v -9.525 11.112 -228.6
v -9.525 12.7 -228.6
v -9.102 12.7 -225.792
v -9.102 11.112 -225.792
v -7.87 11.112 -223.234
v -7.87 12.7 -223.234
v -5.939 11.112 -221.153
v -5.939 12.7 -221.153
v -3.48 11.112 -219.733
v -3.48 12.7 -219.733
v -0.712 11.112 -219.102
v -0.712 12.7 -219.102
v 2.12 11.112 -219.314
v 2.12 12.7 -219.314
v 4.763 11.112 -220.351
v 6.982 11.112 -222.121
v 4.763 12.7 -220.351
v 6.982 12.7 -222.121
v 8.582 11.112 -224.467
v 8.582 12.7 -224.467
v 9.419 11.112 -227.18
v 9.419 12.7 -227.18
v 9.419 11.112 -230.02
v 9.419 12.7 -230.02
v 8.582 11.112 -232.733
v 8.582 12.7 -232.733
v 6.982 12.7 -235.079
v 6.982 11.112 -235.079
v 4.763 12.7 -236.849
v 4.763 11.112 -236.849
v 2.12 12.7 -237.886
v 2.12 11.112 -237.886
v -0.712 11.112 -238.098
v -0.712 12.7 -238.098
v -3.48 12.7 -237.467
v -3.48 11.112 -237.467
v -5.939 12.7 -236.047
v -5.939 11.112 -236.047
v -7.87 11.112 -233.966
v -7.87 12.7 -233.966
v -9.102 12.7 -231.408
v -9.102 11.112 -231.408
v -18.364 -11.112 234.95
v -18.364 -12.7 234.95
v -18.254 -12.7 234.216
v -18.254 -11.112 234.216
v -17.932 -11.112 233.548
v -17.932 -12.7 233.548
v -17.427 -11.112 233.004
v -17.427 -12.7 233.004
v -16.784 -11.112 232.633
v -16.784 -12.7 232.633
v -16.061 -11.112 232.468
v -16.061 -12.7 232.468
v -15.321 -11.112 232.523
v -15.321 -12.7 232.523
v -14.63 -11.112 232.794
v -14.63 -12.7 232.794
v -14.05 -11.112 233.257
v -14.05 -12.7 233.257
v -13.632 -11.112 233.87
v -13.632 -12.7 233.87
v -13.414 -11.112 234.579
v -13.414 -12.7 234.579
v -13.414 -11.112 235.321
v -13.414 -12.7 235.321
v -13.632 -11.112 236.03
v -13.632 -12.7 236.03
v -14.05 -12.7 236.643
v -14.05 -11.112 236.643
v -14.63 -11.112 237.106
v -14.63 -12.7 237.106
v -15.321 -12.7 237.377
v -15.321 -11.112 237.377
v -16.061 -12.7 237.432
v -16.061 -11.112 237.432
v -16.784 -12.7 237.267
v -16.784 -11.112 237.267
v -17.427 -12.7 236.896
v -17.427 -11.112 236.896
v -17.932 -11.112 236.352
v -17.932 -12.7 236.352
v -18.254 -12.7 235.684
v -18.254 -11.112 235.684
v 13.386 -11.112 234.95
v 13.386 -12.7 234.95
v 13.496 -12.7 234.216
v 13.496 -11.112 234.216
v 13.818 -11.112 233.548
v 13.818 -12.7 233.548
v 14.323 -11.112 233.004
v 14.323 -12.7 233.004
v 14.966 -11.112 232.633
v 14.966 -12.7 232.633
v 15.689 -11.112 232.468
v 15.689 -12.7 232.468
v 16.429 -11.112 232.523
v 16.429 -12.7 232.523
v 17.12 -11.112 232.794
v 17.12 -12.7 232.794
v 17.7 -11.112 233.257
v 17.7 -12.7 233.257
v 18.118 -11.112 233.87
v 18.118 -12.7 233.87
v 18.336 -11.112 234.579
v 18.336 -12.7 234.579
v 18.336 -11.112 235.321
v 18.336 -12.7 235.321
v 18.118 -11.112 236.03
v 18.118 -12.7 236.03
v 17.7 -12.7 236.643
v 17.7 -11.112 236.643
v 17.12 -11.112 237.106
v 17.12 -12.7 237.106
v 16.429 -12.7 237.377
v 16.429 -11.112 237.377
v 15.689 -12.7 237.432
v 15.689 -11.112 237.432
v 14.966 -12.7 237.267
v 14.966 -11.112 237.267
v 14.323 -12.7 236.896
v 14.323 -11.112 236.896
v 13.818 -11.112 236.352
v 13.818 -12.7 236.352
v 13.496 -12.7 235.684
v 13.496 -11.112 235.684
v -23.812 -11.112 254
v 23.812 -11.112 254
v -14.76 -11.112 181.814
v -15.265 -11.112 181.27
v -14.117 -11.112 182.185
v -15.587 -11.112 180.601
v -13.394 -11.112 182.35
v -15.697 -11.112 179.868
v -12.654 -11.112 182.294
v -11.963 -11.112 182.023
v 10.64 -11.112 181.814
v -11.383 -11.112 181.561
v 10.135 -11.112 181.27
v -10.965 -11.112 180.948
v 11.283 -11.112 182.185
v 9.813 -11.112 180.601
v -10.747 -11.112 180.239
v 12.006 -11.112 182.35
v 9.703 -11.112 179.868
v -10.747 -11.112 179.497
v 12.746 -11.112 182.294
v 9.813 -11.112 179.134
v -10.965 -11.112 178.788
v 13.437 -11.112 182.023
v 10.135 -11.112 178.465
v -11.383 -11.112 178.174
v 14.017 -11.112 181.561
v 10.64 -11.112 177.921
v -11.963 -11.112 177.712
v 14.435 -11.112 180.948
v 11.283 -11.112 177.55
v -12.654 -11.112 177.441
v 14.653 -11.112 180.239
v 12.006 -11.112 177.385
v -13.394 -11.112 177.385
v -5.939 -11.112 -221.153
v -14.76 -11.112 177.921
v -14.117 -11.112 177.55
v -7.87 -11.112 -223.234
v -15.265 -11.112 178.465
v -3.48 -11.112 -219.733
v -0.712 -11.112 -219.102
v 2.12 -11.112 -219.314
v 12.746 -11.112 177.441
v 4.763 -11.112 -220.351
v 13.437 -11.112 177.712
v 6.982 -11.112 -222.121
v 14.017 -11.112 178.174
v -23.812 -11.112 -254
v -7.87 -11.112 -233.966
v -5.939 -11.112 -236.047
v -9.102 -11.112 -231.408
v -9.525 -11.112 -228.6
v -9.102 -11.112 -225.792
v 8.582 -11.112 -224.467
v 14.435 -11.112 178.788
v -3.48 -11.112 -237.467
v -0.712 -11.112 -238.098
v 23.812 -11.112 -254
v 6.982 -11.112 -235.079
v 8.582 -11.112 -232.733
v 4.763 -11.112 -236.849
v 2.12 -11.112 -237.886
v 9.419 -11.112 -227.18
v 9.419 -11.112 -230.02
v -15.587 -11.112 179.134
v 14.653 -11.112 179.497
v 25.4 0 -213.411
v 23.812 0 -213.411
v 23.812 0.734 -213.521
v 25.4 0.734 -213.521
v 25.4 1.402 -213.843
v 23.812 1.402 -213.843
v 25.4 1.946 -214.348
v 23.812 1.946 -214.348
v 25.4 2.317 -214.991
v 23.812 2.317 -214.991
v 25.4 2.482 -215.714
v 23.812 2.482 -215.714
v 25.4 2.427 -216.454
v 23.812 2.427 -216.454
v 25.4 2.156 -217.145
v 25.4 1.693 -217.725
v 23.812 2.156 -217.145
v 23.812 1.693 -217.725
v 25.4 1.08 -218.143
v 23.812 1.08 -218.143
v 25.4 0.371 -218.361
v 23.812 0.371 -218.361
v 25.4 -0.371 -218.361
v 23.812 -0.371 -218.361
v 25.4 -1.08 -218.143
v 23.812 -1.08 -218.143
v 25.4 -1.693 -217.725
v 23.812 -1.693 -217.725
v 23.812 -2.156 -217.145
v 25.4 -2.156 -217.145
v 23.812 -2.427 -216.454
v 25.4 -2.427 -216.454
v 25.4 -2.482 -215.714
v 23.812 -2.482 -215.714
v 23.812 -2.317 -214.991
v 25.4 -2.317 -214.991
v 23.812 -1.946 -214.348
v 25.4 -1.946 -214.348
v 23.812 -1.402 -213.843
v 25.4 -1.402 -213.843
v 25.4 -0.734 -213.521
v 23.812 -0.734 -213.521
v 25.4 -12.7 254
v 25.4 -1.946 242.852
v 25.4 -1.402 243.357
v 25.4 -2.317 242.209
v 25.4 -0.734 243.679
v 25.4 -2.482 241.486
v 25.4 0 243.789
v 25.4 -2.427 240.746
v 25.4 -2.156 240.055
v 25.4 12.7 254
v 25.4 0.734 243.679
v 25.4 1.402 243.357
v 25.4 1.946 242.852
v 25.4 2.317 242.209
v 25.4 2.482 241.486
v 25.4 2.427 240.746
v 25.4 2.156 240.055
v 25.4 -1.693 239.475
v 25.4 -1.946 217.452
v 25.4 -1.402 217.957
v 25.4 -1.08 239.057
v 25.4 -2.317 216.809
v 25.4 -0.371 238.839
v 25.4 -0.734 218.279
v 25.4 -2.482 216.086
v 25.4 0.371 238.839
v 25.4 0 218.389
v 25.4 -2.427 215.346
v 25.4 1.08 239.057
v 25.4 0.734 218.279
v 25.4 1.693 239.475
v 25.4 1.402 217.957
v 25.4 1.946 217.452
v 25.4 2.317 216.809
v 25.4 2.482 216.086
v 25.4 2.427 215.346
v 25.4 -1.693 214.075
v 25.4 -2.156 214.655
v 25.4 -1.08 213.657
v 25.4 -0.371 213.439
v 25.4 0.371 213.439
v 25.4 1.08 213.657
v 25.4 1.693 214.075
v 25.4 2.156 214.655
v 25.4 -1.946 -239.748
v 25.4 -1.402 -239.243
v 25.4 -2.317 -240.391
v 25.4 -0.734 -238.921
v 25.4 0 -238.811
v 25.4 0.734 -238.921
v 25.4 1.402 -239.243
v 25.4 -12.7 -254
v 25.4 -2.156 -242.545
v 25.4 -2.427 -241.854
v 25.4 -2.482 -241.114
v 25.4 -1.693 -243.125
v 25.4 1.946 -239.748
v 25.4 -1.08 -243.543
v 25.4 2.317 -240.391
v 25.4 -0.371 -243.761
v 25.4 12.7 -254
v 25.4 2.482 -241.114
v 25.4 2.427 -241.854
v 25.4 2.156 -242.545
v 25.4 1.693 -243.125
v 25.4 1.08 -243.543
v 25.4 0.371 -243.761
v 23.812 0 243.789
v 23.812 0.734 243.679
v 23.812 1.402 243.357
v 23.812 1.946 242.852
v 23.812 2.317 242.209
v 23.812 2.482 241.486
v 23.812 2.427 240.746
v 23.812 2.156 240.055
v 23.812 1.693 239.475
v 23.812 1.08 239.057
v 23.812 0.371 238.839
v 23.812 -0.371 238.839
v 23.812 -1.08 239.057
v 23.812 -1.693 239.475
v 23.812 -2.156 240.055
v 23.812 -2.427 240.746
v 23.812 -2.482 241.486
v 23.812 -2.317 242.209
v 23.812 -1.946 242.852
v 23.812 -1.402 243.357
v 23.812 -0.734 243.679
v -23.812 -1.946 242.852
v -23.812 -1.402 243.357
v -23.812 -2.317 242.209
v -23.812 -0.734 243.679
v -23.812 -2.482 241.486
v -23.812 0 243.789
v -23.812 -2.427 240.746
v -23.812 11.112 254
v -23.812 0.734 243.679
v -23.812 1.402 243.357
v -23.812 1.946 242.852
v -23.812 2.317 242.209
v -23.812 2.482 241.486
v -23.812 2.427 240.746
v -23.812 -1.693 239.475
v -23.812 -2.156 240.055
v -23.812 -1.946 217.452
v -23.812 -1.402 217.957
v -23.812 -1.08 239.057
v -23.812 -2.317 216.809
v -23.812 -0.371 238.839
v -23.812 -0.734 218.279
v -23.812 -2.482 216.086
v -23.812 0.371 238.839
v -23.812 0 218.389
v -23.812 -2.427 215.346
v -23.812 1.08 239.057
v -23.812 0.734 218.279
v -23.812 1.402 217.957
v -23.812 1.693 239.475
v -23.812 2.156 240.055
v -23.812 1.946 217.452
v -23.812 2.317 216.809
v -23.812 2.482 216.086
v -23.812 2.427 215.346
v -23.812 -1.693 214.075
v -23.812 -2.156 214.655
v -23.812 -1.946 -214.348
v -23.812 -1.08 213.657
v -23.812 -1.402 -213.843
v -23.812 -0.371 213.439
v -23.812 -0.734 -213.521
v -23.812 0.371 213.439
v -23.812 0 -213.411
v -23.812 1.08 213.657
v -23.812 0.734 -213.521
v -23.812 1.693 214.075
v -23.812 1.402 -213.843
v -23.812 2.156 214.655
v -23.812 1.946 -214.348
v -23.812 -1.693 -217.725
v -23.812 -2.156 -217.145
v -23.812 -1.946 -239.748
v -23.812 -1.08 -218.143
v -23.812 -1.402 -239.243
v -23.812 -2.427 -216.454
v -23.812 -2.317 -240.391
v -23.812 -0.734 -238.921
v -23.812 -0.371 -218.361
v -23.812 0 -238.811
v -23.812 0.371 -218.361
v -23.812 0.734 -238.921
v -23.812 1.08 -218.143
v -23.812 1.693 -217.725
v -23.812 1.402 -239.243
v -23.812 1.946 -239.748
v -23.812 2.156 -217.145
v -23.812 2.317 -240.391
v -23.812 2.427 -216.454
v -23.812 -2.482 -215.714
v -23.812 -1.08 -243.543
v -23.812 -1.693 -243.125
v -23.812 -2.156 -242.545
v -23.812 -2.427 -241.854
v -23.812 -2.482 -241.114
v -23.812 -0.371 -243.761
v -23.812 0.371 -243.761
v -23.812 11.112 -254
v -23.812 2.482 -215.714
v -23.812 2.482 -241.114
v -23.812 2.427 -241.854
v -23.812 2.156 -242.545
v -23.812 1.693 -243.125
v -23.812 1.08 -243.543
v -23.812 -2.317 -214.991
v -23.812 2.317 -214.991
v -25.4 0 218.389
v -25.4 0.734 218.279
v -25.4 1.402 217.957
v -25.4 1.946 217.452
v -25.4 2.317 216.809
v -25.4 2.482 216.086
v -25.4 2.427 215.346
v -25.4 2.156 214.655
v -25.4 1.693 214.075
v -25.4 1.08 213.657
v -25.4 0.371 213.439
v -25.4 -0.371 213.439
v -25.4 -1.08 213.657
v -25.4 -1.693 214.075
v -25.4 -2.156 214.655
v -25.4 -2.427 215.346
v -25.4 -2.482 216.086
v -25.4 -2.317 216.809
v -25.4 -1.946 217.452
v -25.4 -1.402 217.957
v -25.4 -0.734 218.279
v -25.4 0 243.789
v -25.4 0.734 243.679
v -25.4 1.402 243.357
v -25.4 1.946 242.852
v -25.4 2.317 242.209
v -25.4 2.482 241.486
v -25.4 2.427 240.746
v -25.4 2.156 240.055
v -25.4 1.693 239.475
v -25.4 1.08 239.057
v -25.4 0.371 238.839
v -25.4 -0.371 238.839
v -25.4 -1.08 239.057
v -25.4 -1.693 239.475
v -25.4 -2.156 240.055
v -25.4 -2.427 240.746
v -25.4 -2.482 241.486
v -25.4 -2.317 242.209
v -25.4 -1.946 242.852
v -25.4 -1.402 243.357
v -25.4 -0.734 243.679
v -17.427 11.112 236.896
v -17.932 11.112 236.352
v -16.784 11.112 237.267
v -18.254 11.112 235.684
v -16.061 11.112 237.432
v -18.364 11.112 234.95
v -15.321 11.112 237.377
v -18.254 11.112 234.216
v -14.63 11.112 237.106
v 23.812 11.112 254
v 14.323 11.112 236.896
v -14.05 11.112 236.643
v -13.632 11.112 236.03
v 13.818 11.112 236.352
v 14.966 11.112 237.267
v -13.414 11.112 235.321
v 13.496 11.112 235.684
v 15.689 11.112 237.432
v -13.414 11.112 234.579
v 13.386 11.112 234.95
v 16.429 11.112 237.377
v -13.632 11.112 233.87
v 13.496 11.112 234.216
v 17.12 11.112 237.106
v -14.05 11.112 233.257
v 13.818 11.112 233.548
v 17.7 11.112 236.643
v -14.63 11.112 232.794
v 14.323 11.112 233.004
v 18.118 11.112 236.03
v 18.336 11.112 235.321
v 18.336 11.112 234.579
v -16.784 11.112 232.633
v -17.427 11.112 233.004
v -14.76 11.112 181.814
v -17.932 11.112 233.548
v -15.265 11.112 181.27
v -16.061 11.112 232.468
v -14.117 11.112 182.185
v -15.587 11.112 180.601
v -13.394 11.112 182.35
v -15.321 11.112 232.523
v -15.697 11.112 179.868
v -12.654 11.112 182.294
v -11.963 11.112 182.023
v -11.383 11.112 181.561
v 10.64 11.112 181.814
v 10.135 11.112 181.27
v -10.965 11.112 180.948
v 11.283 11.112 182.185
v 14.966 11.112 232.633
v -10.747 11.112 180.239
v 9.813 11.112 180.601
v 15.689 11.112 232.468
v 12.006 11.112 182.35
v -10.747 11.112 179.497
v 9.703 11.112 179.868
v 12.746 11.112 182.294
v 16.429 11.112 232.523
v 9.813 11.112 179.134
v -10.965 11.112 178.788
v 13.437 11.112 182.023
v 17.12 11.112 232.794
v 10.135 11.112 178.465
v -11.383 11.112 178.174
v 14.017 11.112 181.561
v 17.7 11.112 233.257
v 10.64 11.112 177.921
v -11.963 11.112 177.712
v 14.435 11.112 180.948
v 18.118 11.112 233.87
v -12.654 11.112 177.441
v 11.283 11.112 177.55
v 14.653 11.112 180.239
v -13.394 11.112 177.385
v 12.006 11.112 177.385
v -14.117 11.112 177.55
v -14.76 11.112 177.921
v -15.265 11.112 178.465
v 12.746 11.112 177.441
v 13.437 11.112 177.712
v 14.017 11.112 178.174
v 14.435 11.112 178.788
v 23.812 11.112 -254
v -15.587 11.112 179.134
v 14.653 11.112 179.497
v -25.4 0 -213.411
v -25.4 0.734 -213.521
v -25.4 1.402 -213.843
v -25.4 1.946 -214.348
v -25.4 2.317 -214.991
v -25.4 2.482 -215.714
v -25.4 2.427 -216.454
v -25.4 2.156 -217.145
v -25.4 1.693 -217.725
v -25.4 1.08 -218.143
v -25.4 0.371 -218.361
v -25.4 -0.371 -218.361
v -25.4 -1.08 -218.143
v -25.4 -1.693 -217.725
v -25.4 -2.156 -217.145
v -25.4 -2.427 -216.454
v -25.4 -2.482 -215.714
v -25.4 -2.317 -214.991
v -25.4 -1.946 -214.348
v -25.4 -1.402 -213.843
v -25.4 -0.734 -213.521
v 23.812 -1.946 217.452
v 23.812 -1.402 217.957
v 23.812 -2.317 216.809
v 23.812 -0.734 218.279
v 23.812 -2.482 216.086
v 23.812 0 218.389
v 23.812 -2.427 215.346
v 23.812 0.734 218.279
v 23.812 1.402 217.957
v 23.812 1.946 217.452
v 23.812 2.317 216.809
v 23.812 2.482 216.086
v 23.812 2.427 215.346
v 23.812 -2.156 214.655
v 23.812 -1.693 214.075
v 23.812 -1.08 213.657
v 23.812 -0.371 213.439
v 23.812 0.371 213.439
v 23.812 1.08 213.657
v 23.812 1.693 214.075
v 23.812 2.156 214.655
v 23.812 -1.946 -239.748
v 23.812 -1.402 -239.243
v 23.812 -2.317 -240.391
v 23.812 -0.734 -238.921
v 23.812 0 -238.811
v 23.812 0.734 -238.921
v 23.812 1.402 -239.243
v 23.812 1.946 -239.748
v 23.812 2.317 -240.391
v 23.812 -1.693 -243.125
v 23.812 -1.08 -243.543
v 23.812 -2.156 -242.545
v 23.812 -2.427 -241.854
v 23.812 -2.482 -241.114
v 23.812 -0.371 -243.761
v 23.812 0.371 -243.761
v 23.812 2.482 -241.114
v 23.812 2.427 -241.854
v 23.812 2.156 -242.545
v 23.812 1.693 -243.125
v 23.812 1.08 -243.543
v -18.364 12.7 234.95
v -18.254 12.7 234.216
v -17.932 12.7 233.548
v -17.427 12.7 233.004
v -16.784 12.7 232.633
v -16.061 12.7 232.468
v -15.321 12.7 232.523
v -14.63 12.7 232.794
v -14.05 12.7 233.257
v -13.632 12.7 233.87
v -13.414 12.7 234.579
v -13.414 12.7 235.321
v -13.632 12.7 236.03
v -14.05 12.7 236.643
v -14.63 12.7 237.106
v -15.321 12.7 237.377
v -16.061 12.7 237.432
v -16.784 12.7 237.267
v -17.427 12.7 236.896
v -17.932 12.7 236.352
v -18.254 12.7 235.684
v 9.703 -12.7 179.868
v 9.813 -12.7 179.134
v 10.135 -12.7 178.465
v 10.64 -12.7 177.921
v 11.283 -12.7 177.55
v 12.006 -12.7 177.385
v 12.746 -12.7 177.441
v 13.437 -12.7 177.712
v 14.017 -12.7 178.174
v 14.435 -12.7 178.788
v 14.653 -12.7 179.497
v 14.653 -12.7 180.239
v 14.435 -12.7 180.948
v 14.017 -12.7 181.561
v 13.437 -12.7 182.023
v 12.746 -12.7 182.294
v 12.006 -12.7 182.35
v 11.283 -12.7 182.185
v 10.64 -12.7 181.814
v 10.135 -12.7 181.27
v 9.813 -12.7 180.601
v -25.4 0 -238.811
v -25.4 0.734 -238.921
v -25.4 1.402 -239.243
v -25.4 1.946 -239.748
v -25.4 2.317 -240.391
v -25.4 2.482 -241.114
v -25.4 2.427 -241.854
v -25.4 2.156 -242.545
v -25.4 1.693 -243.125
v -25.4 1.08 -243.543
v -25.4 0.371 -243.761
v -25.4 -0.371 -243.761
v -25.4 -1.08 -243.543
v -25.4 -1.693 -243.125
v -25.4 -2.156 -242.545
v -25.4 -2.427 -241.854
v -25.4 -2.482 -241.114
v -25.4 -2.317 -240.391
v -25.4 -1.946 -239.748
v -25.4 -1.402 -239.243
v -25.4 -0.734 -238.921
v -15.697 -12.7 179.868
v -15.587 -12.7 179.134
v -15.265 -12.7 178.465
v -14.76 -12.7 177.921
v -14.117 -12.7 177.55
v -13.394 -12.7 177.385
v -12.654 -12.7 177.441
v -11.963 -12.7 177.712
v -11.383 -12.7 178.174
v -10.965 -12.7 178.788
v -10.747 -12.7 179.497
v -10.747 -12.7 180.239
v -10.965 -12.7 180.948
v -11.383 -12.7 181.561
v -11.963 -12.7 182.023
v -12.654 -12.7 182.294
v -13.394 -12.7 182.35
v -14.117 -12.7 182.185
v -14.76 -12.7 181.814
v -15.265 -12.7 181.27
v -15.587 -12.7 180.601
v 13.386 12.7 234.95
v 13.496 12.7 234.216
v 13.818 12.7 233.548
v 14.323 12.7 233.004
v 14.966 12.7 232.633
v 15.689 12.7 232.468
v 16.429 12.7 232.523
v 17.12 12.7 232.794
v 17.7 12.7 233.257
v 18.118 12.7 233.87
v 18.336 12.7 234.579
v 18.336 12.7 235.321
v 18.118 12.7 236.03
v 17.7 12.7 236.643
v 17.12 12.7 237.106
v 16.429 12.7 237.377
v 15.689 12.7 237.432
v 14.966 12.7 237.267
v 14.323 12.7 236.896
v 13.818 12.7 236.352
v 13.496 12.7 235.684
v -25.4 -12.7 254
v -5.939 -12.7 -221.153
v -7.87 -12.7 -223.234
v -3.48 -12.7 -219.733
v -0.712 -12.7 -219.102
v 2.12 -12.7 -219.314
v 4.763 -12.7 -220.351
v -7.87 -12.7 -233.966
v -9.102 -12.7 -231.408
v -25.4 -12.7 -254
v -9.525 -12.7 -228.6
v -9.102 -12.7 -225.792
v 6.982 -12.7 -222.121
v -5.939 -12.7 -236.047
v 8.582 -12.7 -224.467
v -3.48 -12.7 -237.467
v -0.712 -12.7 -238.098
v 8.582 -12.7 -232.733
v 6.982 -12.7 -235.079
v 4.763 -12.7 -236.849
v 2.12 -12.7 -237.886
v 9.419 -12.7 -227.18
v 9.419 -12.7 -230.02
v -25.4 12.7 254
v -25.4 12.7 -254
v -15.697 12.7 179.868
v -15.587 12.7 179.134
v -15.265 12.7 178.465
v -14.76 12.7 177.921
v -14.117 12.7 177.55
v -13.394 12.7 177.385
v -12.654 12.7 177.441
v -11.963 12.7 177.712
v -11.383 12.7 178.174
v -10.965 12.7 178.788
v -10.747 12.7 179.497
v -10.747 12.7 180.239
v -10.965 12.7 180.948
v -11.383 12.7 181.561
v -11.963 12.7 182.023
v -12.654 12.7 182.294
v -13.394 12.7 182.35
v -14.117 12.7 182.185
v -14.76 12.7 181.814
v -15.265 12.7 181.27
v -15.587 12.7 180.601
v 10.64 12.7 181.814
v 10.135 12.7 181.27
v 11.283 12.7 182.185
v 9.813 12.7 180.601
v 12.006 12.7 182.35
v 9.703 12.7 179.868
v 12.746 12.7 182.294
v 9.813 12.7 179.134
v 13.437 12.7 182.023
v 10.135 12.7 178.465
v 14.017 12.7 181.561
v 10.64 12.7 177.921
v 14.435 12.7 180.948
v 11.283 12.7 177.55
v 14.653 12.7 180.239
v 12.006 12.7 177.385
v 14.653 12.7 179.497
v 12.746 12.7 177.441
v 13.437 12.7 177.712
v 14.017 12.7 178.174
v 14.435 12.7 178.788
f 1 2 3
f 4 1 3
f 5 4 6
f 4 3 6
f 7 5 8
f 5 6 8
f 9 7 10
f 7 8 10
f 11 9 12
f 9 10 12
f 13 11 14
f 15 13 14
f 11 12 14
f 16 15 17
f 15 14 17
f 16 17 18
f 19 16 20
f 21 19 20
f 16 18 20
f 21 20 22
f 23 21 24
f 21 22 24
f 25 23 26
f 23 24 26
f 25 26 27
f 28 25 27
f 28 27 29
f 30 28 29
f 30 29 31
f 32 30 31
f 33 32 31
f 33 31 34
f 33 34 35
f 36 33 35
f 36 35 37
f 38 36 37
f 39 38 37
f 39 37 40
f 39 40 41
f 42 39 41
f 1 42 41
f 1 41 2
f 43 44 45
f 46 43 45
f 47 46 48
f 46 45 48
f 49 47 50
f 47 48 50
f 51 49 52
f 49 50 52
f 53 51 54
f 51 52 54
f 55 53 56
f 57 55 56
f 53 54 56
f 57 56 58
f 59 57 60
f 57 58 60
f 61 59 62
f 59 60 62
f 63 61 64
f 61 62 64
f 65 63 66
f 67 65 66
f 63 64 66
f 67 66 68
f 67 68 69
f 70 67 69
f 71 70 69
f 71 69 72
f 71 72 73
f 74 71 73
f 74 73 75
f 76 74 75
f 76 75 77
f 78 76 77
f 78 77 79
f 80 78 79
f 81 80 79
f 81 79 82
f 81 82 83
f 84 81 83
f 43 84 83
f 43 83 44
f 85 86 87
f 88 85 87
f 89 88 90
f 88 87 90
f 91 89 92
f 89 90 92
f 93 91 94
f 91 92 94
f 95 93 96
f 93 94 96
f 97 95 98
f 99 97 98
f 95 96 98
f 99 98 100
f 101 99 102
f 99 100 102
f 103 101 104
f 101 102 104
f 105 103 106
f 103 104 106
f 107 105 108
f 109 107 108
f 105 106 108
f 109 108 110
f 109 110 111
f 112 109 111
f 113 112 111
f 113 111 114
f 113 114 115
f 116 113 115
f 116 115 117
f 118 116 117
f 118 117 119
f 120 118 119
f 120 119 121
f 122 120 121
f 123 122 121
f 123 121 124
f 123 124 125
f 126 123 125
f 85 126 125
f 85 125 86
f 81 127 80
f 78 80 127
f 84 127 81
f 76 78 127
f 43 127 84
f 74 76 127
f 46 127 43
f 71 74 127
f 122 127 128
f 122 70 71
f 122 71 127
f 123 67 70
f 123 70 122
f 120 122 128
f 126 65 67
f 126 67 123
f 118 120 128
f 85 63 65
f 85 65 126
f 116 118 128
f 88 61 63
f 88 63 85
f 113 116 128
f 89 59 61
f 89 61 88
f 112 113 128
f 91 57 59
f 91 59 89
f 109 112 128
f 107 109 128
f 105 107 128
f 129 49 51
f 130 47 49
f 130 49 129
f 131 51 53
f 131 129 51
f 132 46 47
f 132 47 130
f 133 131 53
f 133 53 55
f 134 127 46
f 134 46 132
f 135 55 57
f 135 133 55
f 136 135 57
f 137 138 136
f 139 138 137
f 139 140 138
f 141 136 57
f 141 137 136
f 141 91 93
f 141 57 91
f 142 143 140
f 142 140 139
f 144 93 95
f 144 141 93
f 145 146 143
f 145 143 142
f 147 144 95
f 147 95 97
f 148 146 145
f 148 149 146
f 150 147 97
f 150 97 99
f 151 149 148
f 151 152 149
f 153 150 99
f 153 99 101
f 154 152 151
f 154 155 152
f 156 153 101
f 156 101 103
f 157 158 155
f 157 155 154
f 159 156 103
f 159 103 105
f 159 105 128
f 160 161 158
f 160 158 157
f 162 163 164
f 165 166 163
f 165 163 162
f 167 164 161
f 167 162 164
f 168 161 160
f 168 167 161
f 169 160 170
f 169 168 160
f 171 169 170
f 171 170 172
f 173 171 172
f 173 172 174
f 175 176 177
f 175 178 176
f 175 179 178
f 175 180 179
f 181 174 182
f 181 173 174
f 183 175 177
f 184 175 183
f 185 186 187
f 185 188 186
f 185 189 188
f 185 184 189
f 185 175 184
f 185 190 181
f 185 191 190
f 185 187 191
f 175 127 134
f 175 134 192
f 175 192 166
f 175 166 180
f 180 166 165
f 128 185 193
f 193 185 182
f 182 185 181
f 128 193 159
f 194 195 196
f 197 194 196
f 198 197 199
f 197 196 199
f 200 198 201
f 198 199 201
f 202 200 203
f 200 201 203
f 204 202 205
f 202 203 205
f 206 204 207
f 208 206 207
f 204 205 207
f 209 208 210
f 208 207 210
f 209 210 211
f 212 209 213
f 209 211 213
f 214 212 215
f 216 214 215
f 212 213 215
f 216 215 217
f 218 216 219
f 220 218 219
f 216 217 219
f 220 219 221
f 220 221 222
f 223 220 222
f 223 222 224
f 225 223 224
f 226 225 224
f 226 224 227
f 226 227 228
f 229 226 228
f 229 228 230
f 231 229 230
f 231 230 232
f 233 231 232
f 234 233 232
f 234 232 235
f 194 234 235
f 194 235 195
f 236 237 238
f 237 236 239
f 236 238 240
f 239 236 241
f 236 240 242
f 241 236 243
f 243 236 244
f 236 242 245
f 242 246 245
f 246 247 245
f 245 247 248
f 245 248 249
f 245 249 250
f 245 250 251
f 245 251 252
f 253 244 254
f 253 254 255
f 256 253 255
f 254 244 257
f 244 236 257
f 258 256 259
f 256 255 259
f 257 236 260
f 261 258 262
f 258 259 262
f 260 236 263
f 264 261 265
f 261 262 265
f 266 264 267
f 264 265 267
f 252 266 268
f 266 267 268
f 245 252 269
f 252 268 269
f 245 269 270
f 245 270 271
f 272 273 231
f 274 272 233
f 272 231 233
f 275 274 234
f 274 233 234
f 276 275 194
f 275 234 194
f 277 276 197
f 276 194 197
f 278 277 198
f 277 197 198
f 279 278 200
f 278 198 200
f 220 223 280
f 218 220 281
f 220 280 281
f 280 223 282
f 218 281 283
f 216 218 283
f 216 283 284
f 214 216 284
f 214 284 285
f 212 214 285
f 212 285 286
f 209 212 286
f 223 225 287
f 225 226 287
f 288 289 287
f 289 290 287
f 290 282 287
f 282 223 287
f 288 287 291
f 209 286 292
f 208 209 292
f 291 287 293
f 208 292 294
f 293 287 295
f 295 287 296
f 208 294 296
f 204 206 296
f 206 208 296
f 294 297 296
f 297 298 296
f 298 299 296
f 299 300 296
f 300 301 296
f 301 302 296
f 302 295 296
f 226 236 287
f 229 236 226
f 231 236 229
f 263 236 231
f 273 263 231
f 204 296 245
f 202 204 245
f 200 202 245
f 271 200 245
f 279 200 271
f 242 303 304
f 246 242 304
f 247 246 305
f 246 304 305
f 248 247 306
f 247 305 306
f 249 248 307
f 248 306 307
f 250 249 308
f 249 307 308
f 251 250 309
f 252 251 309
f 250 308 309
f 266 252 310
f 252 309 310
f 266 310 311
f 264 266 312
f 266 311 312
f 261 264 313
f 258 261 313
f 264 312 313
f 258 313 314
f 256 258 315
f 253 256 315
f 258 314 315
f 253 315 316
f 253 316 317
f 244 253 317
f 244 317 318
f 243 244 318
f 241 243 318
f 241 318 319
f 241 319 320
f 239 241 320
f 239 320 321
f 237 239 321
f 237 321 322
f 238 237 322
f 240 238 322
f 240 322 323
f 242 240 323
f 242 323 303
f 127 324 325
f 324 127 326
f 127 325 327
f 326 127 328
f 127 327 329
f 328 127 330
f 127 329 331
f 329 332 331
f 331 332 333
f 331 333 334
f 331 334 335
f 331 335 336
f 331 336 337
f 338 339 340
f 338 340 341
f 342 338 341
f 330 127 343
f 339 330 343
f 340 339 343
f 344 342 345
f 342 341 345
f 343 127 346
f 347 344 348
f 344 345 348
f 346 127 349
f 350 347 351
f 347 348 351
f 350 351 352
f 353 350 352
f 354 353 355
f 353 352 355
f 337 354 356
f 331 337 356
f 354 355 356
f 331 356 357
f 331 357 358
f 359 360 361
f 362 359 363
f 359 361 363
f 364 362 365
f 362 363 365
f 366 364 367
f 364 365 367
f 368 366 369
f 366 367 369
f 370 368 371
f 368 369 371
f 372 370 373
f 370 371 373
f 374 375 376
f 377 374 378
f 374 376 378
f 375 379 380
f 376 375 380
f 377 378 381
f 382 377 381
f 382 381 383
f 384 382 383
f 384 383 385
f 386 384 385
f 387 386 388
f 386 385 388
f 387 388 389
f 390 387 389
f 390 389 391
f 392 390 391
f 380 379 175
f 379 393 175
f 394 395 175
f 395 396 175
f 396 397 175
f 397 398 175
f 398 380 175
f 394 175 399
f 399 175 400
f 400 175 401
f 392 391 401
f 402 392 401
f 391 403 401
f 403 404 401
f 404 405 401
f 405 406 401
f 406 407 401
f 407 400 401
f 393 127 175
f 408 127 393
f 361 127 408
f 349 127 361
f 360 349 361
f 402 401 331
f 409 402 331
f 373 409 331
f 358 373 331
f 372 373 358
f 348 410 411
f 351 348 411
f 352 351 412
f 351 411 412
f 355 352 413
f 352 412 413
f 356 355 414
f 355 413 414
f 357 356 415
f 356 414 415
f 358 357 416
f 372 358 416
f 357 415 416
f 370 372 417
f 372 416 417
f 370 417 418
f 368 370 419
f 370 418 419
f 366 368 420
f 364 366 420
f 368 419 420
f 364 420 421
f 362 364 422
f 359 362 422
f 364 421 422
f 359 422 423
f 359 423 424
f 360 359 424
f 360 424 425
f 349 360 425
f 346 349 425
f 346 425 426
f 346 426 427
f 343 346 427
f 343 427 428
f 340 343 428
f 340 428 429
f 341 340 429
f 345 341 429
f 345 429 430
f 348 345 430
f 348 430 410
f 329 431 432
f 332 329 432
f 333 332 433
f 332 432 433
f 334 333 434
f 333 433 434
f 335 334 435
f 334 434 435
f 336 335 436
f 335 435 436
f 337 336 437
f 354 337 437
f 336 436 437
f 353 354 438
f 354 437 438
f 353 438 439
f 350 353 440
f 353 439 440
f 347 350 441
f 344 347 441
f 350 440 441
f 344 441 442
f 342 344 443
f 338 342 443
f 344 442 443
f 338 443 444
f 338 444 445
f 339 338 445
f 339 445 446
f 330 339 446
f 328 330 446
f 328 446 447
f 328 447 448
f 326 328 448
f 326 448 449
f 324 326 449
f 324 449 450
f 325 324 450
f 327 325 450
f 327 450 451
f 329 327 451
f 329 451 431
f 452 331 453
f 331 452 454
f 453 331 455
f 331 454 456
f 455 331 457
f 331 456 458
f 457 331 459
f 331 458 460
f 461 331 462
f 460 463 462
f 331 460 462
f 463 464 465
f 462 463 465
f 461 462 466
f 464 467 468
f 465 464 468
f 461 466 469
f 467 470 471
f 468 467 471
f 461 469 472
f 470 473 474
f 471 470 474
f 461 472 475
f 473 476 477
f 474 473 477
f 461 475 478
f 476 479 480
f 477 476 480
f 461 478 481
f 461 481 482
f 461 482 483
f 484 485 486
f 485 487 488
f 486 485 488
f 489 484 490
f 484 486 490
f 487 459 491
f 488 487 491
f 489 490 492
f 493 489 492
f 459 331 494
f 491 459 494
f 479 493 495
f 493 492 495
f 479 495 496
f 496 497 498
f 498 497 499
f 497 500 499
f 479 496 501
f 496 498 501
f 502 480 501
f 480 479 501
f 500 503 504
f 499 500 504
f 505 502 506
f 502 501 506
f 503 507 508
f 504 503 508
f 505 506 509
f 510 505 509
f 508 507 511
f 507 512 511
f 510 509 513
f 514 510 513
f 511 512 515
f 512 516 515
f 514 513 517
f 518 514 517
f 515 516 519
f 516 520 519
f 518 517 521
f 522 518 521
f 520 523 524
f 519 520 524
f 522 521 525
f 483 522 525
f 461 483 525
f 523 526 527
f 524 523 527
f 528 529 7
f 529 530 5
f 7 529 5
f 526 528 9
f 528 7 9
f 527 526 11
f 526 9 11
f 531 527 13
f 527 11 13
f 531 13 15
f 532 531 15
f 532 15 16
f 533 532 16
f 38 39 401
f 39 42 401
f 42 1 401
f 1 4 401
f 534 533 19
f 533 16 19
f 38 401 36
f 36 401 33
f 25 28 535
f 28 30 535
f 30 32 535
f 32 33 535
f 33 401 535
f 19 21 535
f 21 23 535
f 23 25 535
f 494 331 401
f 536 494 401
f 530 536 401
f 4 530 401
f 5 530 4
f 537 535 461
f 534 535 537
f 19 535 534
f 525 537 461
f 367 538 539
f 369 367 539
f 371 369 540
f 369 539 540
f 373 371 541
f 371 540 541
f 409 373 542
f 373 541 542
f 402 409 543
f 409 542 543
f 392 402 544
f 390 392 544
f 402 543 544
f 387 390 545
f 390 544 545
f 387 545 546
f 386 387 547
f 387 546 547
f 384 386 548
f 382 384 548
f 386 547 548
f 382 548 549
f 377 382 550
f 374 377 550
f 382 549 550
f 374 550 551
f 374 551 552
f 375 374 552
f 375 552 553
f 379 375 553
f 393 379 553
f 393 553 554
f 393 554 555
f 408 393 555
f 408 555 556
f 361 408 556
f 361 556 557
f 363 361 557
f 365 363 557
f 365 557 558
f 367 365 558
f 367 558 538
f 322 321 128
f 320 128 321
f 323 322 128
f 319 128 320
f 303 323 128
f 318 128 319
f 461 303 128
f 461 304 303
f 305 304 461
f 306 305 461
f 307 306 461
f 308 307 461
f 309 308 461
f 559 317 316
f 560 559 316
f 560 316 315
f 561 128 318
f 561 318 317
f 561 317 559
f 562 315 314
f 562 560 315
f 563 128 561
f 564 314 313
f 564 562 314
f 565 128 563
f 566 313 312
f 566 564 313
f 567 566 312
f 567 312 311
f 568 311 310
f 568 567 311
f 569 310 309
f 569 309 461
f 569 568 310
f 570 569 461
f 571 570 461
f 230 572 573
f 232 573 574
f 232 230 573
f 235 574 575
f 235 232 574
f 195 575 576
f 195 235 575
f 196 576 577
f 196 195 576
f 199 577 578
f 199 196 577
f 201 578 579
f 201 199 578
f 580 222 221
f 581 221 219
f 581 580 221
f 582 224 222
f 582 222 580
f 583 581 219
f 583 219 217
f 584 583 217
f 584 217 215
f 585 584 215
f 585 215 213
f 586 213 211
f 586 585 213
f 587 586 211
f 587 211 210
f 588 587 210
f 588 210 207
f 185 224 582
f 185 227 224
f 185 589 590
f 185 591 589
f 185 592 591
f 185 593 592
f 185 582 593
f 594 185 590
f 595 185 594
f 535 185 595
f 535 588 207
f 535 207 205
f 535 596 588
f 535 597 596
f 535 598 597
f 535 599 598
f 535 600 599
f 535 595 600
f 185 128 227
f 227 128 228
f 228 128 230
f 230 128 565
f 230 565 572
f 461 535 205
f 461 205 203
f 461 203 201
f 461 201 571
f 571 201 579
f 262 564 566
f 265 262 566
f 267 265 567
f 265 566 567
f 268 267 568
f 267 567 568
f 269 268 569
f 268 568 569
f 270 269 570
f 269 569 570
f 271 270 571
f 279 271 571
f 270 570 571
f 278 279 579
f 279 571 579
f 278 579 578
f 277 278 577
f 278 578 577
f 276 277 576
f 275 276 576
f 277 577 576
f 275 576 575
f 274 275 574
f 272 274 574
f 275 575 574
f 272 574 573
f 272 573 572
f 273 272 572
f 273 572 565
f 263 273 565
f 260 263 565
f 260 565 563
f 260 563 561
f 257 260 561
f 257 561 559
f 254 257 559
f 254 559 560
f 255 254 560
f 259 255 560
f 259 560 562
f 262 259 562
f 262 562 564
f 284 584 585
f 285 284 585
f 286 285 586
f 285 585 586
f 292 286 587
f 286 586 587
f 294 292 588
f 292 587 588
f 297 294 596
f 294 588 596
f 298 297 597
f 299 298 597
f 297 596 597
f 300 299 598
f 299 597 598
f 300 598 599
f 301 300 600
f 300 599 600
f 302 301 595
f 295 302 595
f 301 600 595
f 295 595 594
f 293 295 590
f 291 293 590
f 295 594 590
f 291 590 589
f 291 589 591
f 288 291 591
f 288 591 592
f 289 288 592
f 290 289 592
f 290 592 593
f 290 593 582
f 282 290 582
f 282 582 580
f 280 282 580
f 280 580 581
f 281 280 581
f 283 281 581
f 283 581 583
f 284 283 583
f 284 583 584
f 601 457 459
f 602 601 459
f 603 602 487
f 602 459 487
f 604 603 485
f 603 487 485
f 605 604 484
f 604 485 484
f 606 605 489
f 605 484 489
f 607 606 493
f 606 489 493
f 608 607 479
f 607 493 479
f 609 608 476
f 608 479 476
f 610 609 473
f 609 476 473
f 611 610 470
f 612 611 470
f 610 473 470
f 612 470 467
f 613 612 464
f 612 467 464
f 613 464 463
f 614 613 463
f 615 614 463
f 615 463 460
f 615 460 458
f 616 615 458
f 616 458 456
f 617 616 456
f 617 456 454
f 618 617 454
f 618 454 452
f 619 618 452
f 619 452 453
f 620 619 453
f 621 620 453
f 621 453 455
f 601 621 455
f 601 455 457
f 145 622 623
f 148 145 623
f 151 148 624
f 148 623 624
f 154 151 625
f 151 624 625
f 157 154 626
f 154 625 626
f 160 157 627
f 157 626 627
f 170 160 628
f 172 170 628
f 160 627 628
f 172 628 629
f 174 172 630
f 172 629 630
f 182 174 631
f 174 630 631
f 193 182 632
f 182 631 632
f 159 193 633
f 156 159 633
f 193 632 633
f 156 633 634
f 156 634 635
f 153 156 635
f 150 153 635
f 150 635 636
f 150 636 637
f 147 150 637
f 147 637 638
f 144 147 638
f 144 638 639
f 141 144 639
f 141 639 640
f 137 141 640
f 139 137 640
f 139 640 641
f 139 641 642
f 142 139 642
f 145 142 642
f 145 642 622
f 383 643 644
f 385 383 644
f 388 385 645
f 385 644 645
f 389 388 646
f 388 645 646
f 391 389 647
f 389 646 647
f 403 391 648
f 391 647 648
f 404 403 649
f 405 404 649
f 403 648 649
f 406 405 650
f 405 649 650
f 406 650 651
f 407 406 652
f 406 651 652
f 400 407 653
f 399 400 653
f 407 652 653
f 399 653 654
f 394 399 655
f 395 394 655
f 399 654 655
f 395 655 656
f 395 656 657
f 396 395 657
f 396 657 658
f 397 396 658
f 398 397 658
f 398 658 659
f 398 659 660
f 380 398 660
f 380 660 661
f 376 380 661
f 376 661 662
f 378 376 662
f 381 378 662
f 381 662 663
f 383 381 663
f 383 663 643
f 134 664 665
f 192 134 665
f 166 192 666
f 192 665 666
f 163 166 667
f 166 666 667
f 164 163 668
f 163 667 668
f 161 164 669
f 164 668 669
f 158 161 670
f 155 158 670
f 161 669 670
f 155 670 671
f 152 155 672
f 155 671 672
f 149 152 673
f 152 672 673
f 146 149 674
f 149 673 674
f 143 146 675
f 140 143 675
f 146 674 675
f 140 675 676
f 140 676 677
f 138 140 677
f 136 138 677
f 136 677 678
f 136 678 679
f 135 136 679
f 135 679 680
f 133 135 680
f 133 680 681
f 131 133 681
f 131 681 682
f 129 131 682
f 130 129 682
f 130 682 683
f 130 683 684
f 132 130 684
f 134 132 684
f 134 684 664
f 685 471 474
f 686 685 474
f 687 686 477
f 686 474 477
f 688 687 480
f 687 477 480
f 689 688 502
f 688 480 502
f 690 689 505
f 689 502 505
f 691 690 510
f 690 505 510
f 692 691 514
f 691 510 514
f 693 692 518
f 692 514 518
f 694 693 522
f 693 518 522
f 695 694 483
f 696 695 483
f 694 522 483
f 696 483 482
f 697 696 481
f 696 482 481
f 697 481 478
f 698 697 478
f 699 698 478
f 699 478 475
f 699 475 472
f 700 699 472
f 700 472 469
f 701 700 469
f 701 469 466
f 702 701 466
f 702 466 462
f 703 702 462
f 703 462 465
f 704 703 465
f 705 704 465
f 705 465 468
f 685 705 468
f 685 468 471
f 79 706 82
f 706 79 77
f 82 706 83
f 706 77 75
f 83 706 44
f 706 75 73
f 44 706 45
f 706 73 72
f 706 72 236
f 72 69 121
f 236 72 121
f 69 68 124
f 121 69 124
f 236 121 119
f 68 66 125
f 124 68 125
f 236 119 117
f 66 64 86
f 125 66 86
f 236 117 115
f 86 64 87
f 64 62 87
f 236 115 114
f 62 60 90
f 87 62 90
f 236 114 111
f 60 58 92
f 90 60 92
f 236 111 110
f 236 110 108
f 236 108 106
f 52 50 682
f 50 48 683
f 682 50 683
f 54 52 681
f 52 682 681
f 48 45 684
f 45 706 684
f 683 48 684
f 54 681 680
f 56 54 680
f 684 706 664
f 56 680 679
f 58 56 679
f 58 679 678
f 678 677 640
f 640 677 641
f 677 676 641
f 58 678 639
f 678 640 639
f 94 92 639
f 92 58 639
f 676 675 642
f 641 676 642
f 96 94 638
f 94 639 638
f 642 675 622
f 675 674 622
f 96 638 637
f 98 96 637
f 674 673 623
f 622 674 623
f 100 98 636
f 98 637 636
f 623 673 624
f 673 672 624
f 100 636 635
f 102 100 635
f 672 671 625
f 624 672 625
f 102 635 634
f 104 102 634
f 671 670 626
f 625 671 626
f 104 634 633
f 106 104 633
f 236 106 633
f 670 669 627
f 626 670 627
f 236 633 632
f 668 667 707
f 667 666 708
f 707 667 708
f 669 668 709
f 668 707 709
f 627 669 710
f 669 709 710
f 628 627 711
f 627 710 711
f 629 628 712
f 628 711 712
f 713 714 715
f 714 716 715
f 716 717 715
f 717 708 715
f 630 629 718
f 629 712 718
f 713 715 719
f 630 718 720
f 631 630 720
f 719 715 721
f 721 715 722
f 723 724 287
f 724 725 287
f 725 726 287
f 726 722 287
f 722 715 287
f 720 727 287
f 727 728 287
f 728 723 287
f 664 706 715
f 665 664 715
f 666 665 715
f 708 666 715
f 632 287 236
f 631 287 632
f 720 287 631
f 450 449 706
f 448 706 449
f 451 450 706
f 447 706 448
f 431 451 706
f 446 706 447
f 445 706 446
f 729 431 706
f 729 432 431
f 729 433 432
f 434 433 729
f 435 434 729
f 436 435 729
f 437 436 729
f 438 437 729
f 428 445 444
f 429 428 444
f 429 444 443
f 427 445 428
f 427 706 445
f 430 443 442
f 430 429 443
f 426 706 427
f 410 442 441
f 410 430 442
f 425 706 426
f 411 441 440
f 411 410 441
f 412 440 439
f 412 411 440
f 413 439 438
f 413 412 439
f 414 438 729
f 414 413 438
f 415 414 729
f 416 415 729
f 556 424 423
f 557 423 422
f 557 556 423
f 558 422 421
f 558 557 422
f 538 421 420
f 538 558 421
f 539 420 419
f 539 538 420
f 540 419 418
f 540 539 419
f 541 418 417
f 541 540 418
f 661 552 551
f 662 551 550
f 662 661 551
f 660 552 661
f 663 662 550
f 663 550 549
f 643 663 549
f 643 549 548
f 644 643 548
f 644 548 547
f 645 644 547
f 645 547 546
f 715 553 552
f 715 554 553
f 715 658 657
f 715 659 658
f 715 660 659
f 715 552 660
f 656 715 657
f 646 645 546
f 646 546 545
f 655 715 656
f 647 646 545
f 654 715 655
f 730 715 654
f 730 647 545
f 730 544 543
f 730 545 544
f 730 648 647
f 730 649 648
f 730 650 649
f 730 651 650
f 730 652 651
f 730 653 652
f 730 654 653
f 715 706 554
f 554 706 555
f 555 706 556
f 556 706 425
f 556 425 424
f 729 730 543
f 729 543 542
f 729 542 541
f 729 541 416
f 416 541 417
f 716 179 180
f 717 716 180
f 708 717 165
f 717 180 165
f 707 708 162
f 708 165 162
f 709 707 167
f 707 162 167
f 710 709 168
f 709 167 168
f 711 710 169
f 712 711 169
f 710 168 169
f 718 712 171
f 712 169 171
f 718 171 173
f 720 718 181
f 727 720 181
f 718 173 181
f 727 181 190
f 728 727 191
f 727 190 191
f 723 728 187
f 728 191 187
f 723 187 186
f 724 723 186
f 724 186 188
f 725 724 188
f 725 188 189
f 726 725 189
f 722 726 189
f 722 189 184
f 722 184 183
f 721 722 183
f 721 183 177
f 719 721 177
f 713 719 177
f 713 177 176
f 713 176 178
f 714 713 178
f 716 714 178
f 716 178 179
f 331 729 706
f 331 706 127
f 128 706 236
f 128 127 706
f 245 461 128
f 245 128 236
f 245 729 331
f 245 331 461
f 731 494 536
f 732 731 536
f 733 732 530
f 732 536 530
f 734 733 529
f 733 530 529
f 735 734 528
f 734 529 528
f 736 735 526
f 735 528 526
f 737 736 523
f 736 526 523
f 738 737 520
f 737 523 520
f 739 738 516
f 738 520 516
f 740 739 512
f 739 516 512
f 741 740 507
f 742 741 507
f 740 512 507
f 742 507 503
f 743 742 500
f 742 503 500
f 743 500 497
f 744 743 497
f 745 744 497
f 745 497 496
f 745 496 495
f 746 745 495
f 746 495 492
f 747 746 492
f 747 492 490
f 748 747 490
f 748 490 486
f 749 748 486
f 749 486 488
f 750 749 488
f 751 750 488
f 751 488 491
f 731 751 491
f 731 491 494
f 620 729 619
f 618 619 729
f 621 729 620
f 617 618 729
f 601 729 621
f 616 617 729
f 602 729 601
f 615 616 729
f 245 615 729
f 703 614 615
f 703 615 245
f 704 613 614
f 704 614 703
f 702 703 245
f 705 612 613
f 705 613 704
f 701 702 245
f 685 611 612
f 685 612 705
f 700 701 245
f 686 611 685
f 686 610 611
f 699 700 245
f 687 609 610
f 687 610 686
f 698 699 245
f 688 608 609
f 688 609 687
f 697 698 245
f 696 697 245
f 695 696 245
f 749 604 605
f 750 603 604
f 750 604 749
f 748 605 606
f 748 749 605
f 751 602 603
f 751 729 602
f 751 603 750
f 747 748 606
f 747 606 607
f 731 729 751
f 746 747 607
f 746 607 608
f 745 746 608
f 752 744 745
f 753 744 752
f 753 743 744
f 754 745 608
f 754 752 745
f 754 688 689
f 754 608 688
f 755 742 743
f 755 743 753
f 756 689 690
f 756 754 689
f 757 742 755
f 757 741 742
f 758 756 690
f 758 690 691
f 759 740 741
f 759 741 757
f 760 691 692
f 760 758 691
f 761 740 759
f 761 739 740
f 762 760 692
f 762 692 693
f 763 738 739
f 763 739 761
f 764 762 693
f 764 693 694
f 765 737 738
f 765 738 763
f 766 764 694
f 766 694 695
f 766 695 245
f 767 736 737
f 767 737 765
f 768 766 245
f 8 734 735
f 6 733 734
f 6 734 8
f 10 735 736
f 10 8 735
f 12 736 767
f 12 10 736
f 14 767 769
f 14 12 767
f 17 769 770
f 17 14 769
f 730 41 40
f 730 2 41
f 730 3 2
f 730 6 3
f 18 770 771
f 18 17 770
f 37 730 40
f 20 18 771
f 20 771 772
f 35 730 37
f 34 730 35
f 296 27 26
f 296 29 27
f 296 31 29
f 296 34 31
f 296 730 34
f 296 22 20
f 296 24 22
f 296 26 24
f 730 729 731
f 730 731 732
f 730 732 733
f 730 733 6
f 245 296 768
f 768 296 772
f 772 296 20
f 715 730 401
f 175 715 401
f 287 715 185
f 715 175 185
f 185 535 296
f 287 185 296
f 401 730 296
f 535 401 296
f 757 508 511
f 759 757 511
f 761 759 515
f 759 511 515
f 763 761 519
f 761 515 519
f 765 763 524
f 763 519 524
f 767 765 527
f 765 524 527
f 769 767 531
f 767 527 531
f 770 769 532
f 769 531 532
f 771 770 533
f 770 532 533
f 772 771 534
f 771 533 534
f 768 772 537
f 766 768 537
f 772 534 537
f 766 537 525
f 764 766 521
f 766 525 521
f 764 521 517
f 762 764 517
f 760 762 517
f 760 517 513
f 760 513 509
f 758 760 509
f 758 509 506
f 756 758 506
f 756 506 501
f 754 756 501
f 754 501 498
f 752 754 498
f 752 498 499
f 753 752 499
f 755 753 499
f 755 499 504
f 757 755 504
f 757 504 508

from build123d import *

# Parameters (mm, degrees)
BOSS_EXTRUDE1_DEPTH      = 254.000001
BOSS_EXTRUDE1_DEPTH_BACK = 254.000001
SKETCH3_W                = 50.8
SKETCH3_H                = 25.4
SKETCH3_W_2              = 47.625
SKETCH3_H_2              = 22.225
F_10_CLEARANCE_HOLE1_D   = 4.9784
F_10_CLEARANCE_HOLE2_D   = 4.9784
SKETCH11_R               = 9.525
CUT_EXTRUDE1_DEPTH       = 257.527426425


with BuildPart() as part:
    # Sketch3 → Boss-Extrude1 (new, two sides: drawn at the far end of the back side and taken through both)
    with BuildSketch(Plane.XY.offset(-BOSS_EXTRUDE1_DEPTH_BACK)):
        Rectangle(SKETCH3_W, SKETCH3_H)
        Rectangle(SKETCH3_W_2, SKETCH3_H_2, mode=Mode.SUBTRACT)
    extrude(amount=BOSS_EXTRUDE1_DEPTH + BOSS_EXTRUDE1_DEPTH_BACK)

    # #10 Clearance Hole1 (through all)
    with Locations(Plane(origin=(25.4, 0, 0), x_dir=(0, 0, -1), z_dir=(1, 0, 0))):
        with Locations((-241.300000508, 0), (-215.900000508, 0), (215.899999492, 0), (241.299999492, 0)):
            Hole(F_10_CLEARANCE_HOLE1_D / 2)

    # #10 Clearance Hole2 (through all)
    with Locations(Plane(origin=(0, 12.7, 0), x_dir=(1, 0, 0), z_dir=(0, 1, 0))):
        with Locations((-13.207999909, -179.867533038), (12.192000091, -179.867533038), (-15.875, -234.950000508), (15.875, -234.950000508)):
            Hole(F_10_CLEARANCE_HOLE2_D / 2)

    # Sketch11 → Cut-Extrude1 (cut, through all)
    with BuildSketch(Plane(origin=(0, 12.7, 0), x_dir=(1, 0, 0), z_dir=(0, 1, 0))):
        with Locations(Location((0, 228.600000508, 0), (0, 0, 180))):
            Circle(SKETCH11_R)
    extrude(amount=-CUT_EXTRUDE1_DEPTH, mode=Mode.SUBTRACT)


solid = part.part
